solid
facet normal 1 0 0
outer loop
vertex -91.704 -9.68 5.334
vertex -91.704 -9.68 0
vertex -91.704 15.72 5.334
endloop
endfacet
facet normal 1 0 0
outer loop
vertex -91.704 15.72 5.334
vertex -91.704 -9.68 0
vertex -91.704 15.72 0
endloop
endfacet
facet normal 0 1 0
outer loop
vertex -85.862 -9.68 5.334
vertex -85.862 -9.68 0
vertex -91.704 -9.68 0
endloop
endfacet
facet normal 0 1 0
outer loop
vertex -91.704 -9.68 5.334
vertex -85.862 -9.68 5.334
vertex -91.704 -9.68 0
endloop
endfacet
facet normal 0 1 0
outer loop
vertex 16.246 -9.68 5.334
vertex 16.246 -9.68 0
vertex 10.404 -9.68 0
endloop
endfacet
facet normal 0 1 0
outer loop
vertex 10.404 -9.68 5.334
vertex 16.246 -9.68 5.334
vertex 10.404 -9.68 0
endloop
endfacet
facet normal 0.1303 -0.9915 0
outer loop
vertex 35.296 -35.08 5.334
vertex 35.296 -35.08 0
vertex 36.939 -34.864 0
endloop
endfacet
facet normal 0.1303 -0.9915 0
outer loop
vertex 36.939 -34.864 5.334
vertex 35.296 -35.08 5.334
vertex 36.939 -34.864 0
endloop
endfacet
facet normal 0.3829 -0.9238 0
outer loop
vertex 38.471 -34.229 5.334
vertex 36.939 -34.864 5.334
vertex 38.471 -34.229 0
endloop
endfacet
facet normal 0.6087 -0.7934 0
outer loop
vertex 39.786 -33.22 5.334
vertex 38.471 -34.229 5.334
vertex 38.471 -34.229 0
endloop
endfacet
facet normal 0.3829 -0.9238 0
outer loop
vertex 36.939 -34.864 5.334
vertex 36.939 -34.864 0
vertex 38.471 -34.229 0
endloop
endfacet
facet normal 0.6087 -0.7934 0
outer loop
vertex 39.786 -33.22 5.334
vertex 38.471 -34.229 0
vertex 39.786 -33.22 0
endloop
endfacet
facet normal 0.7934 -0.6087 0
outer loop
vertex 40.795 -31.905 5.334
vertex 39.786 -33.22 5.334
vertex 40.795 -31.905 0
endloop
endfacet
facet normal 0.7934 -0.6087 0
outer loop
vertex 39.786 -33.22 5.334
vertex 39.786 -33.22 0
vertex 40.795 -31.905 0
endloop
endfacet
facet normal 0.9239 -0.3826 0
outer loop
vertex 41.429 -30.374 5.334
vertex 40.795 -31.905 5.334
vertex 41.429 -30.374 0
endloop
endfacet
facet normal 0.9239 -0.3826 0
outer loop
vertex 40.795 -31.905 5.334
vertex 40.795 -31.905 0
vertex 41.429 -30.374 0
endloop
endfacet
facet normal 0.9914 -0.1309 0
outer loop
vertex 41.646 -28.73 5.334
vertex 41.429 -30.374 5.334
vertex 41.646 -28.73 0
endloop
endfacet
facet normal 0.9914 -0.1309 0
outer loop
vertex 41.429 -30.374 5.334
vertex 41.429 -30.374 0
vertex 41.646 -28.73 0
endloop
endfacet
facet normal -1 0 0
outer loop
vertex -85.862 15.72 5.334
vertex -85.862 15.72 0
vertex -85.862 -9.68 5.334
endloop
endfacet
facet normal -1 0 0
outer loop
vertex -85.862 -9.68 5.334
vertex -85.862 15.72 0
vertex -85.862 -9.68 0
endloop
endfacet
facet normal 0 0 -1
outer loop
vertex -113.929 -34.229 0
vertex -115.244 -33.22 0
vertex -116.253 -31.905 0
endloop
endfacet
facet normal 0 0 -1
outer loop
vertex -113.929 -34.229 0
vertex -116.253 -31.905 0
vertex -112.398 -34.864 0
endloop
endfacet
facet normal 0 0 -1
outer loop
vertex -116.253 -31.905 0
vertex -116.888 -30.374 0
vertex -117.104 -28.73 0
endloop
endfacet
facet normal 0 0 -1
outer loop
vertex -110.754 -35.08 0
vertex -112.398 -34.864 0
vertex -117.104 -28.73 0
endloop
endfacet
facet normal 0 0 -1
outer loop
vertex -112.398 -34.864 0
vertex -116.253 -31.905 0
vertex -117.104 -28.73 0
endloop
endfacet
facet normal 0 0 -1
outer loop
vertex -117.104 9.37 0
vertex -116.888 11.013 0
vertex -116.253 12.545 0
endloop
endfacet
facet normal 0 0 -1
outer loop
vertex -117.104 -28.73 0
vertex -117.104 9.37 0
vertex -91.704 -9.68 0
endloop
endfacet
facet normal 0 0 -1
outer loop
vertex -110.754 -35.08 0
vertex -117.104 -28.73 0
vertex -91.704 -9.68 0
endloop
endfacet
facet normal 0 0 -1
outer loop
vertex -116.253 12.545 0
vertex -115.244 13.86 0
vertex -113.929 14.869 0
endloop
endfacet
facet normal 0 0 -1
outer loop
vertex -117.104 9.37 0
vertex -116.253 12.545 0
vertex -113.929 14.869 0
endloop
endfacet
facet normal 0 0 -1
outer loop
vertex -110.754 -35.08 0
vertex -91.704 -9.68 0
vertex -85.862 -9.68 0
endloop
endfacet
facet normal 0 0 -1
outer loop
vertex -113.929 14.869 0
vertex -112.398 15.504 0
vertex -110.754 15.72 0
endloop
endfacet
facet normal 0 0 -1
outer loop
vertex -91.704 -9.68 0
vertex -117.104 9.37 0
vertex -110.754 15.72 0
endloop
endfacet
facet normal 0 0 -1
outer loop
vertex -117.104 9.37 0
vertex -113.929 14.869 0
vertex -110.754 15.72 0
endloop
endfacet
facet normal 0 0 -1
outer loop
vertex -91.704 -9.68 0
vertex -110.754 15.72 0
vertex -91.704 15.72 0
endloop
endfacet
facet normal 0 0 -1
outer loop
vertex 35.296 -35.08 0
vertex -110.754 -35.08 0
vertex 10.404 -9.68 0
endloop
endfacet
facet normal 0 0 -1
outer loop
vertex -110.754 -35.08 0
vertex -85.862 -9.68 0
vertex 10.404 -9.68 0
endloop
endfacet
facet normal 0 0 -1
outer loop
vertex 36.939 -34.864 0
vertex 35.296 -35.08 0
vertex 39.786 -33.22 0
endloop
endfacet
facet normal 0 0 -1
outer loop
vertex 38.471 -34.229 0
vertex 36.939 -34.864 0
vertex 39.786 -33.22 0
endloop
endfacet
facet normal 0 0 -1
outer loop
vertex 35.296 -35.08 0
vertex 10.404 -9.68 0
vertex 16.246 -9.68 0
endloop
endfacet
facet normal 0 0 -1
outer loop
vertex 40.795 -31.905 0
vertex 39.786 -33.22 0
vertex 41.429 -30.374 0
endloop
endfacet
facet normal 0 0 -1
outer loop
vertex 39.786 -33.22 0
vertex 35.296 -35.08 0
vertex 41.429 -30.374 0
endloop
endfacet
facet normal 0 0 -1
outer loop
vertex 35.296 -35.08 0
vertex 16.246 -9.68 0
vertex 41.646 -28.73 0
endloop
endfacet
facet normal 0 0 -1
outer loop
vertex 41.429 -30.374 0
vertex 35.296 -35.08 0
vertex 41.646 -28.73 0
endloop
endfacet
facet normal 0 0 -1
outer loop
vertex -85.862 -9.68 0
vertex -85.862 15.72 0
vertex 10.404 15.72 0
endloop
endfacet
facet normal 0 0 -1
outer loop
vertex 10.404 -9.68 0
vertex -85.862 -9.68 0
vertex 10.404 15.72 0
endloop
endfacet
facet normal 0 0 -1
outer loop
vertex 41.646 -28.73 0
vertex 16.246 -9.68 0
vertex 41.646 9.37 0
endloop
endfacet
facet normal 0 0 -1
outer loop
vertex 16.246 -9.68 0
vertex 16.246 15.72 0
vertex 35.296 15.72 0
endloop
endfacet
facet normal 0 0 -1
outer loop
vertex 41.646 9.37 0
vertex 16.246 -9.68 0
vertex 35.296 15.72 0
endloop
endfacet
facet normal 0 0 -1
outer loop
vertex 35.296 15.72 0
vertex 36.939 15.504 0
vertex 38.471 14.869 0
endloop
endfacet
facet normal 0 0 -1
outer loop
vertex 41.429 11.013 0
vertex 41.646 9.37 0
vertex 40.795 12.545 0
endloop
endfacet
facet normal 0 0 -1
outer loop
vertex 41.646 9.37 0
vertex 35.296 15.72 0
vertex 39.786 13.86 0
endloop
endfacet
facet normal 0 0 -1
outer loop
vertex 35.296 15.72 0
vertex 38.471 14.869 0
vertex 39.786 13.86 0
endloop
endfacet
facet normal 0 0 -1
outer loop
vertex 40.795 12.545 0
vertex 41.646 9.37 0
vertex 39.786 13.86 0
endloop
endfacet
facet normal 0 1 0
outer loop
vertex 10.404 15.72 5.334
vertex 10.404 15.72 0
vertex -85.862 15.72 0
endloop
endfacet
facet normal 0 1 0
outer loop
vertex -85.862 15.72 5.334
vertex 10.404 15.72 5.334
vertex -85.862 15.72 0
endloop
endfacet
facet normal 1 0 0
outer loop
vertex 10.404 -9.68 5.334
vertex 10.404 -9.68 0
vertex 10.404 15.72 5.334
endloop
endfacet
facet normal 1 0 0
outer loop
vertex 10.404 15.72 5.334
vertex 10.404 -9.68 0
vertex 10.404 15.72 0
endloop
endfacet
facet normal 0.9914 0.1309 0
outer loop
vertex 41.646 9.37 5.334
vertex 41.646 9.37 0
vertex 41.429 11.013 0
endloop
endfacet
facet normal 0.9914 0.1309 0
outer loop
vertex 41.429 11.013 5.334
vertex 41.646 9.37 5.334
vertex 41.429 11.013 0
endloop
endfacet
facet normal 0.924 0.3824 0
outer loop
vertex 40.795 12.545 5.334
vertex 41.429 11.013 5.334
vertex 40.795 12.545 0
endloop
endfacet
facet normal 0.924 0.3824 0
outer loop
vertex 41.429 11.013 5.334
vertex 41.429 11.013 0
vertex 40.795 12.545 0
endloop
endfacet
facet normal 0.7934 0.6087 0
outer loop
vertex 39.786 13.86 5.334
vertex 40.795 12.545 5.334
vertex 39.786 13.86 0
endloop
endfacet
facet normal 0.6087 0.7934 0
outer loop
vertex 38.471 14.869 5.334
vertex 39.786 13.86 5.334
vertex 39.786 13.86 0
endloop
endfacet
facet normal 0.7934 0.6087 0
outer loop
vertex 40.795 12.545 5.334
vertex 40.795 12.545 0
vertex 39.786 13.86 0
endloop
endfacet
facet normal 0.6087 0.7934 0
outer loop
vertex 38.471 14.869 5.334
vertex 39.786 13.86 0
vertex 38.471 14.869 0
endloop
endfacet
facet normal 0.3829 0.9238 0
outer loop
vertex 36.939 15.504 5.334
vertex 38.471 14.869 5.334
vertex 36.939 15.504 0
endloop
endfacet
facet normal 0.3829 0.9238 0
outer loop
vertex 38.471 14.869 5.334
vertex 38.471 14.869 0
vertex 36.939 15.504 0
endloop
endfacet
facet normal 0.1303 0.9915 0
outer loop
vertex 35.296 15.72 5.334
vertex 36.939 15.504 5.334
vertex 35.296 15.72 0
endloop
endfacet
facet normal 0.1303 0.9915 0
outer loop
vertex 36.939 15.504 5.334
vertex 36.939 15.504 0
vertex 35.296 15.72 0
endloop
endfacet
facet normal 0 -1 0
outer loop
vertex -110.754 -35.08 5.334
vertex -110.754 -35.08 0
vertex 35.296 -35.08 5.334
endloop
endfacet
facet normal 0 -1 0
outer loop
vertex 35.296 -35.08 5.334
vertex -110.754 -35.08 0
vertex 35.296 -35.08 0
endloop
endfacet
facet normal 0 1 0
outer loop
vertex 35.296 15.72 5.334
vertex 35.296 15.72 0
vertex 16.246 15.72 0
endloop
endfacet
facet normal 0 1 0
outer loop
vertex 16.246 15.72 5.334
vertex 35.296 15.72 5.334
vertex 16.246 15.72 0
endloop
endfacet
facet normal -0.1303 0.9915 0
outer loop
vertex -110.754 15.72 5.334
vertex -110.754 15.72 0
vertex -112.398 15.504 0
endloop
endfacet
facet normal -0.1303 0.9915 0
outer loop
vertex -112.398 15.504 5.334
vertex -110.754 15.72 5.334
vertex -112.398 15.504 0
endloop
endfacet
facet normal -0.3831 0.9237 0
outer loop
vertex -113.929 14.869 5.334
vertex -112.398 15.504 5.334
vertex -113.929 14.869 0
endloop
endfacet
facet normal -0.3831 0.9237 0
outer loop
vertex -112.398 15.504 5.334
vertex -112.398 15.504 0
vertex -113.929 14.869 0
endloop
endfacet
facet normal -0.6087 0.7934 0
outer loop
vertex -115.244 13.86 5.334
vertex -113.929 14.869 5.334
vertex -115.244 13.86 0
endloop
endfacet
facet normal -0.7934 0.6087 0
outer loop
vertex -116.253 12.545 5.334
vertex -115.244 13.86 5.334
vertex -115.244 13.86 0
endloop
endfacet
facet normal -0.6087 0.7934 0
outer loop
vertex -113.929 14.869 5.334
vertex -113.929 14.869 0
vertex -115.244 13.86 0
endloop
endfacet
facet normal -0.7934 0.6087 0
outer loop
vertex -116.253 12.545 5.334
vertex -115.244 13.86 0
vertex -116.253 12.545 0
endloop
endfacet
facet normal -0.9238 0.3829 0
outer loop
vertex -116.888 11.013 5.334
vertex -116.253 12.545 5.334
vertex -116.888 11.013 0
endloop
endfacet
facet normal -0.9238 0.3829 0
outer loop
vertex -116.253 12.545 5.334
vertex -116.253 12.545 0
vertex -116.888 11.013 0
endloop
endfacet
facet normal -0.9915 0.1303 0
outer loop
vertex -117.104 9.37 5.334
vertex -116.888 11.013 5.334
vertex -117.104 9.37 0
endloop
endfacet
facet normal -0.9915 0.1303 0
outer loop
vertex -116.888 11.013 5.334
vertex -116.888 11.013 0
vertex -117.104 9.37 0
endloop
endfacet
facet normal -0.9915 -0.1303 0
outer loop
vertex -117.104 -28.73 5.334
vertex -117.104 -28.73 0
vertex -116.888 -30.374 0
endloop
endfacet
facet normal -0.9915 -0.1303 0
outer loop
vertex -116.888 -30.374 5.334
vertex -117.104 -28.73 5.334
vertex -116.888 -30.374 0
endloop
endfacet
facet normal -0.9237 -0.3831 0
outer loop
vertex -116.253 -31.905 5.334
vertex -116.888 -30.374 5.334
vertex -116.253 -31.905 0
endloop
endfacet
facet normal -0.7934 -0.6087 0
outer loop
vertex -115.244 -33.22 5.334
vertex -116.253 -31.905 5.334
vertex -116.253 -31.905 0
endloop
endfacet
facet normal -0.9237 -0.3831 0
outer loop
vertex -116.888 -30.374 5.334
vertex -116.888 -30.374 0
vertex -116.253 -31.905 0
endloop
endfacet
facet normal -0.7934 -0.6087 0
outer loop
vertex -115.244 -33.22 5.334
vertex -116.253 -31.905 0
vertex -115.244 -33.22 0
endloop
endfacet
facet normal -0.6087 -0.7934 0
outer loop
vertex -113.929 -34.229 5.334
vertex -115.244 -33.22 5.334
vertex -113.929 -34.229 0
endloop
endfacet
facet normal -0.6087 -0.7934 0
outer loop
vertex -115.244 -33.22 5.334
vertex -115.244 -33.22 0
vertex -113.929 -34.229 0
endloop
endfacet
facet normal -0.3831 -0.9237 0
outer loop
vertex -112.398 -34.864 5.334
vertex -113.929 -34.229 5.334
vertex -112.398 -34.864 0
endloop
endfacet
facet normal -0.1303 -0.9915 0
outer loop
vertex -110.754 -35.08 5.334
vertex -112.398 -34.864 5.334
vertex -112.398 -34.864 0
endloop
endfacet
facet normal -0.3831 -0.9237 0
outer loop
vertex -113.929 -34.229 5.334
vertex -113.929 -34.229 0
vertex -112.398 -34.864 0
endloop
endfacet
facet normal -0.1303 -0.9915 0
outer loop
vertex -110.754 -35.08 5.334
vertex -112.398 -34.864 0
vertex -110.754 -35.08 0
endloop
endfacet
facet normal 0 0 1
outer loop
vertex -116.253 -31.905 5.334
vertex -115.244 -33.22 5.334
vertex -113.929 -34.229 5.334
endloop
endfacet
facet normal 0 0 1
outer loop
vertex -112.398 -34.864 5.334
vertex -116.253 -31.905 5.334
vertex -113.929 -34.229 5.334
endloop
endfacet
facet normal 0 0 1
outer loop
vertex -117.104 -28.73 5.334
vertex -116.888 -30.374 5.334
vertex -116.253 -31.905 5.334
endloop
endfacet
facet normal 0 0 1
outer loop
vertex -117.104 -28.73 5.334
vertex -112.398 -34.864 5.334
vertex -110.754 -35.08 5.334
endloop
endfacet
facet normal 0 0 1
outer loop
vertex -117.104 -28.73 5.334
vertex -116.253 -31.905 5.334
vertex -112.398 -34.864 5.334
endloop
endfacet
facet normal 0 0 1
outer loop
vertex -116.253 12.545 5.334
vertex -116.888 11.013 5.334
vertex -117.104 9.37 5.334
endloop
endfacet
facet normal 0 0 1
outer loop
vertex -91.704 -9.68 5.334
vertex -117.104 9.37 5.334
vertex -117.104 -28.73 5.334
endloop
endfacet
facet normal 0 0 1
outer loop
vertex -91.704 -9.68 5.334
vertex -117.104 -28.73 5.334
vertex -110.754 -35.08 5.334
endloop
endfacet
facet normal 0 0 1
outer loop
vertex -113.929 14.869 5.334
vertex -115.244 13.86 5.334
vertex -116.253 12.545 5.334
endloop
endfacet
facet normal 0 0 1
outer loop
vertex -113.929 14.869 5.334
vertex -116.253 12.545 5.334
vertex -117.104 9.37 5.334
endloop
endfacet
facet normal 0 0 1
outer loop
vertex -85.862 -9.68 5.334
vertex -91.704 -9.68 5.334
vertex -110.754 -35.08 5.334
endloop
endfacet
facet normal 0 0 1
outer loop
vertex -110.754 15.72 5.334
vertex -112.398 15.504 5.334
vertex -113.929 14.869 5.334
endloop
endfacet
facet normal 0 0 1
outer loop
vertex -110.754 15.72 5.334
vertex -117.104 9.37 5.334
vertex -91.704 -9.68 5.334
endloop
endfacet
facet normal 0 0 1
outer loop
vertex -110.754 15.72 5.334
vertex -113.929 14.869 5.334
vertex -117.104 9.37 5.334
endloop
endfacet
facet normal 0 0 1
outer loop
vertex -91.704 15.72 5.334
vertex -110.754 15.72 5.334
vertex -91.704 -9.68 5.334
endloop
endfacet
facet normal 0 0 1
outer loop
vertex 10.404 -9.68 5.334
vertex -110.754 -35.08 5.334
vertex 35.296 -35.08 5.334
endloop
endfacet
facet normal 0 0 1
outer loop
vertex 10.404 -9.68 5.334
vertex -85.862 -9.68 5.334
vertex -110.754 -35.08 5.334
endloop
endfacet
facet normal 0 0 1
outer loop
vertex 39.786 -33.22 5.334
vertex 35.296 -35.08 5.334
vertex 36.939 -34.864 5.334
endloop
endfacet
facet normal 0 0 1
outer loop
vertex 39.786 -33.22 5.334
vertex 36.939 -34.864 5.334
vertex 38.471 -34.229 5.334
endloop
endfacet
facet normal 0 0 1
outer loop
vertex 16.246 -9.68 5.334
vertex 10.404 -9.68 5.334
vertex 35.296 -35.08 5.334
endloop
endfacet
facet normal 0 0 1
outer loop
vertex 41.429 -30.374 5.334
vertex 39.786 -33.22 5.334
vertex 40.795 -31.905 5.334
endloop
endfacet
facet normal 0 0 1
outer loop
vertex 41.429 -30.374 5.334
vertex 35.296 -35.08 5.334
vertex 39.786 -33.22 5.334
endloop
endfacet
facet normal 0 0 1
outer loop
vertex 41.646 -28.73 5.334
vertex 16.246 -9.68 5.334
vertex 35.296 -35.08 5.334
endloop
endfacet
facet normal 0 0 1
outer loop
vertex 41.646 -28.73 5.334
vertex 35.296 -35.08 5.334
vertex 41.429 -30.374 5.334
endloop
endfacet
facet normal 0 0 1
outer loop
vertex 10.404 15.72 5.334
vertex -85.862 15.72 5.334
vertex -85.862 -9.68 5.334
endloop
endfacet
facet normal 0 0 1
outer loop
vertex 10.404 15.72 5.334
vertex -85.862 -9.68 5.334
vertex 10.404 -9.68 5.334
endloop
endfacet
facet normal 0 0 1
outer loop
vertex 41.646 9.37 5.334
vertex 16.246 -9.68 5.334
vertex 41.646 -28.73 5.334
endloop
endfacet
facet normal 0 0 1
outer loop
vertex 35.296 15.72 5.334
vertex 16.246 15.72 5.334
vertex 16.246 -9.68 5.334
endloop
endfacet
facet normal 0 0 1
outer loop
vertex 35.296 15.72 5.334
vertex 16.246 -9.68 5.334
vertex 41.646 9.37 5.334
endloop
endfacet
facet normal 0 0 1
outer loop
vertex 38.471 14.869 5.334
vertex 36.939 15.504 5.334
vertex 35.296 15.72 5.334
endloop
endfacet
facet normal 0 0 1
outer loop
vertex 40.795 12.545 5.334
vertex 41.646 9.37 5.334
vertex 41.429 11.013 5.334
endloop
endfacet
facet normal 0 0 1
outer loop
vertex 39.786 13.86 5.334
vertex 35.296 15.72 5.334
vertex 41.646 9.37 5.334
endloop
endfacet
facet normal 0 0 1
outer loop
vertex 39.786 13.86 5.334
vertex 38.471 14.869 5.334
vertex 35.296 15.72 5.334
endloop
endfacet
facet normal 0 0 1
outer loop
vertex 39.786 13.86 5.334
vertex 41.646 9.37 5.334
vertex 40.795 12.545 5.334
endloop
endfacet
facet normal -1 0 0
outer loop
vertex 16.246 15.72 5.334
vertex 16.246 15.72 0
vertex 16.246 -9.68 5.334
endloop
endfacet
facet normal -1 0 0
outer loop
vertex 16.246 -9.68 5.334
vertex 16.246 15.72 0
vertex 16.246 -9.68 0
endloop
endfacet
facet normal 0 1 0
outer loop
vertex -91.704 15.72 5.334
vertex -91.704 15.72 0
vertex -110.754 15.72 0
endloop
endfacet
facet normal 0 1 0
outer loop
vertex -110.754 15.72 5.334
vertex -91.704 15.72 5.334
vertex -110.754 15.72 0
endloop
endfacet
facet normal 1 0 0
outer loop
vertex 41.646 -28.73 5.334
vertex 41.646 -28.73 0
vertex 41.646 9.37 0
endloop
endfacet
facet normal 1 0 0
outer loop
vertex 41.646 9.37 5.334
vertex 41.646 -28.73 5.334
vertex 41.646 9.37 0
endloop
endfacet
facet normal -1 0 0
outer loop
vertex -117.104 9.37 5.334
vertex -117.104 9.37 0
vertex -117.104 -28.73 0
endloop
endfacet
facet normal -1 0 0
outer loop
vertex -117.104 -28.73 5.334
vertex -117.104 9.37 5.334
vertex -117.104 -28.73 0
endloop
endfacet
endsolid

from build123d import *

# Parameters (mm, degrees)
F1_DEPTH = 5.334


with BuildPart() as f1:
    # F0 (on Top) → F1 (new body)
    with BuildSketch(Plane.XY):
        with BuildLine():
            Line((-91.704233, 15.719872), (-110.754233, 15.719872))
            ThreePointArc((-110.754233, 15.719872), (-115.244361, 13.86), (-117.104233, 9.369872))
            Line((-117.104233, 9.369872), (-117.104233, -28.730128))
            ThreePointArc((-117.104233, -28.730128), (-115.244361, -33.220256), (-110.754233, -35.080128))
            Line((-110.754233, -35.080128), (35.295767, -35.080128))
            ThreePointArc((35.295767, -35.080128), (39.785895, -33.220256), (41.645767, -28.730128))
            Line((41.645767, -28.730128), (41.645767, 9.369872))
            ThreePointArc((41.645767, 9.369872), (39.785895, 13.86), (35.295767, 15.719872))
            Line((35.295767, 15.719872), (16.245767, 15.719872))
            Line((16.245767, 15.719872), (16.245767, -9.680128))
            Line((16.245767, -9.680128), (10.403767, -9.680128))
            Line((10.403767, -9.680128), (10.403767, 15.719872))
            Line((10.403767, 15.719872), (-85.862233, 15.719872))
            Line((-85.862233, 15.719872), (-85.862233, -9.680128))
            Line((-85.862233, -9.680128), (-91.704233, -9.680128))
            Line((-91.704233, -9.680128), (-91.704233, 15.719872))
        make_face()
    extrude(amount=F1_DEPTH)


solid = f1.part
